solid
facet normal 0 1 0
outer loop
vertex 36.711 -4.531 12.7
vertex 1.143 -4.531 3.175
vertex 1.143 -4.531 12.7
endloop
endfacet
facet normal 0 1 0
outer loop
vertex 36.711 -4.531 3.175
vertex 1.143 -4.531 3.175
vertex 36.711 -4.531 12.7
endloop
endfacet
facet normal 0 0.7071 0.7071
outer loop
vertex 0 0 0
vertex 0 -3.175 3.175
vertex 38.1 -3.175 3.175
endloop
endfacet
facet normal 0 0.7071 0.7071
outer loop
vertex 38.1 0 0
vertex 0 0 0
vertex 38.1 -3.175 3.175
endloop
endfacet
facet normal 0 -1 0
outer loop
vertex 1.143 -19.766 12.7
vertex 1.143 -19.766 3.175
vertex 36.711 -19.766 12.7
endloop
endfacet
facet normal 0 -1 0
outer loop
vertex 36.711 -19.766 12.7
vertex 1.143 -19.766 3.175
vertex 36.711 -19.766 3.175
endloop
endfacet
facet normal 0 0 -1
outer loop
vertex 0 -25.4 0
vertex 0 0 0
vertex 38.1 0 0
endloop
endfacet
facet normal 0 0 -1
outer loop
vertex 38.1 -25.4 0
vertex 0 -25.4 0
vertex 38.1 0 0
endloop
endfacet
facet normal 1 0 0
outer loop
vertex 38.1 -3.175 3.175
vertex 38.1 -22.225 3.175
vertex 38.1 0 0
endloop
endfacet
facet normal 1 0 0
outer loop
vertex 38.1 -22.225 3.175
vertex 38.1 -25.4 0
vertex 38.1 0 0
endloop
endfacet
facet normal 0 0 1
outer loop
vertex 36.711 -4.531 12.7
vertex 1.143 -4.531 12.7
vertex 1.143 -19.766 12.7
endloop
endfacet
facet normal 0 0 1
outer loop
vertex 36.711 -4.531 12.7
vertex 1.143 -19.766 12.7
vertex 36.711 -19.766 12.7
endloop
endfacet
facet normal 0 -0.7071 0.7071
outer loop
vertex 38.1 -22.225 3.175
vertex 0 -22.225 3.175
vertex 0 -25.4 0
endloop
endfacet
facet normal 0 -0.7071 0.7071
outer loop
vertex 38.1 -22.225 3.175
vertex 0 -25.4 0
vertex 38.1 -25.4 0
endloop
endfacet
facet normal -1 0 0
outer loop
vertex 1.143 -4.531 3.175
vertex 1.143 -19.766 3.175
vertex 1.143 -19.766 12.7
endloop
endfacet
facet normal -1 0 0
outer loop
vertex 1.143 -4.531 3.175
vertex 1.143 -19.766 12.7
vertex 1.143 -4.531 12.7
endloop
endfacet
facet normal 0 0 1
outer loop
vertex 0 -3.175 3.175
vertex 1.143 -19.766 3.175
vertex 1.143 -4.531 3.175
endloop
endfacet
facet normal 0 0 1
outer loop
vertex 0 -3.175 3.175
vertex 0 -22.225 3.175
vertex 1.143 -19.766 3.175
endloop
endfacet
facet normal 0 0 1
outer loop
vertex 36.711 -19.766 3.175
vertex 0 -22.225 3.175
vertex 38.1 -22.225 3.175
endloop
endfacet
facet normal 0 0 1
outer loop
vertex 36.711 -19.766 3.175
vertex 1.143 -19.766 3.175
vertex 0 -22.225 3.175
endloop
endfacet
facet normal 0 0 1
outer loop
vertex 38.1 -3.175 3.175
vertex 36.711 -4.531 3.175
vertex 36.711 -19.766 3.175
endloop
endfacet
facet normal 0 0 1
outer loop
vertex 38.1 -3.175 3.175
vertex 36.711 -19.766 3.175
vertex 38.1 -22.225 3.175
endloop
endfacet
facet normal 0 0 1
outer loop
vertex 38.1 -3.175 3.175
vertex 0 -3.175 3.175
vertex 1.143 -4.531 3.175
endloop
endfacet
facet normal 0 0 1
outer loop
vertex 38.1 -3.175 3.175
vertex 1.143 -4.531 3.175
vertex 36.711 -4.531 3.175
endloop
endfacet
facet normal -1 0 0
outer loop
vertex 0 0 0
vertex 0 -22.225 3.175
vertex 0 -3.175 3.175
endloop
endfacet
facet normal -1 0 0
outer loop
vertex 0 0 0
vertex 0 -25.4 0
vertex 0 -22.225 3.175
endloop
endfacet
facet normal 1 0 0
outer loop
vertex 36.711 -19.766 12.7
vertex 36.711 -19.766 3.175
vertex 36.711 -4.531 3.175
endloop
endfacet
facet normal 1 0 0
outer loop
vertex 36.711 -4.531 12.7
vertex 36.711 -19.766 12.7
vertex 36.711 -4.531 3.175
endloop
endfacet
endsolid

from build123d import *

# Parameters (mm, degrees)
F0_W     = 38.1
F0_H     = 25.4
F1_DEPTH = 3.175
F2_SIZE  = 3.17499
F3_W     = 35.5673587183
F3_H     = 15.2347986586
F4_DEPTH = 9.525


# Not quite as in the source:
# - a fillet or chamfer is up to 0.001 mm smaller than in the source, because OpenCascade refuses the exact size


with BuildPart() as f1:
    # F0 (on Top) → F1 (new body)
    with BuildSketch(Plane.XY):
        with Locations((19.05, -12.7)):
            Rectangle(F0_W, F0_H)
    extrude(amount=F1_DEPTH)

    # F2 (size 3.175 in the source; OpenCascade refuses exactly that, so slightly less here)
    f2_edges = [f1.edges().sort_by_distance(p)[0] for p in [
        (19.05, -25.4, 3.175),
        (19.05, 0, 3.175),
    ]]
    chamfer(f2_edges, length=F2_SIZE)

    # F3 (on face) → F4 (join)
    with BuildSketch(Plane.XY.offset(3.175)):
        with Locations((18.9271715353, -12.1486445423)):
            Rectangle(F3_W, F3_H)
    extrude(amount=F4_DEPTH)


solid = f1.part
